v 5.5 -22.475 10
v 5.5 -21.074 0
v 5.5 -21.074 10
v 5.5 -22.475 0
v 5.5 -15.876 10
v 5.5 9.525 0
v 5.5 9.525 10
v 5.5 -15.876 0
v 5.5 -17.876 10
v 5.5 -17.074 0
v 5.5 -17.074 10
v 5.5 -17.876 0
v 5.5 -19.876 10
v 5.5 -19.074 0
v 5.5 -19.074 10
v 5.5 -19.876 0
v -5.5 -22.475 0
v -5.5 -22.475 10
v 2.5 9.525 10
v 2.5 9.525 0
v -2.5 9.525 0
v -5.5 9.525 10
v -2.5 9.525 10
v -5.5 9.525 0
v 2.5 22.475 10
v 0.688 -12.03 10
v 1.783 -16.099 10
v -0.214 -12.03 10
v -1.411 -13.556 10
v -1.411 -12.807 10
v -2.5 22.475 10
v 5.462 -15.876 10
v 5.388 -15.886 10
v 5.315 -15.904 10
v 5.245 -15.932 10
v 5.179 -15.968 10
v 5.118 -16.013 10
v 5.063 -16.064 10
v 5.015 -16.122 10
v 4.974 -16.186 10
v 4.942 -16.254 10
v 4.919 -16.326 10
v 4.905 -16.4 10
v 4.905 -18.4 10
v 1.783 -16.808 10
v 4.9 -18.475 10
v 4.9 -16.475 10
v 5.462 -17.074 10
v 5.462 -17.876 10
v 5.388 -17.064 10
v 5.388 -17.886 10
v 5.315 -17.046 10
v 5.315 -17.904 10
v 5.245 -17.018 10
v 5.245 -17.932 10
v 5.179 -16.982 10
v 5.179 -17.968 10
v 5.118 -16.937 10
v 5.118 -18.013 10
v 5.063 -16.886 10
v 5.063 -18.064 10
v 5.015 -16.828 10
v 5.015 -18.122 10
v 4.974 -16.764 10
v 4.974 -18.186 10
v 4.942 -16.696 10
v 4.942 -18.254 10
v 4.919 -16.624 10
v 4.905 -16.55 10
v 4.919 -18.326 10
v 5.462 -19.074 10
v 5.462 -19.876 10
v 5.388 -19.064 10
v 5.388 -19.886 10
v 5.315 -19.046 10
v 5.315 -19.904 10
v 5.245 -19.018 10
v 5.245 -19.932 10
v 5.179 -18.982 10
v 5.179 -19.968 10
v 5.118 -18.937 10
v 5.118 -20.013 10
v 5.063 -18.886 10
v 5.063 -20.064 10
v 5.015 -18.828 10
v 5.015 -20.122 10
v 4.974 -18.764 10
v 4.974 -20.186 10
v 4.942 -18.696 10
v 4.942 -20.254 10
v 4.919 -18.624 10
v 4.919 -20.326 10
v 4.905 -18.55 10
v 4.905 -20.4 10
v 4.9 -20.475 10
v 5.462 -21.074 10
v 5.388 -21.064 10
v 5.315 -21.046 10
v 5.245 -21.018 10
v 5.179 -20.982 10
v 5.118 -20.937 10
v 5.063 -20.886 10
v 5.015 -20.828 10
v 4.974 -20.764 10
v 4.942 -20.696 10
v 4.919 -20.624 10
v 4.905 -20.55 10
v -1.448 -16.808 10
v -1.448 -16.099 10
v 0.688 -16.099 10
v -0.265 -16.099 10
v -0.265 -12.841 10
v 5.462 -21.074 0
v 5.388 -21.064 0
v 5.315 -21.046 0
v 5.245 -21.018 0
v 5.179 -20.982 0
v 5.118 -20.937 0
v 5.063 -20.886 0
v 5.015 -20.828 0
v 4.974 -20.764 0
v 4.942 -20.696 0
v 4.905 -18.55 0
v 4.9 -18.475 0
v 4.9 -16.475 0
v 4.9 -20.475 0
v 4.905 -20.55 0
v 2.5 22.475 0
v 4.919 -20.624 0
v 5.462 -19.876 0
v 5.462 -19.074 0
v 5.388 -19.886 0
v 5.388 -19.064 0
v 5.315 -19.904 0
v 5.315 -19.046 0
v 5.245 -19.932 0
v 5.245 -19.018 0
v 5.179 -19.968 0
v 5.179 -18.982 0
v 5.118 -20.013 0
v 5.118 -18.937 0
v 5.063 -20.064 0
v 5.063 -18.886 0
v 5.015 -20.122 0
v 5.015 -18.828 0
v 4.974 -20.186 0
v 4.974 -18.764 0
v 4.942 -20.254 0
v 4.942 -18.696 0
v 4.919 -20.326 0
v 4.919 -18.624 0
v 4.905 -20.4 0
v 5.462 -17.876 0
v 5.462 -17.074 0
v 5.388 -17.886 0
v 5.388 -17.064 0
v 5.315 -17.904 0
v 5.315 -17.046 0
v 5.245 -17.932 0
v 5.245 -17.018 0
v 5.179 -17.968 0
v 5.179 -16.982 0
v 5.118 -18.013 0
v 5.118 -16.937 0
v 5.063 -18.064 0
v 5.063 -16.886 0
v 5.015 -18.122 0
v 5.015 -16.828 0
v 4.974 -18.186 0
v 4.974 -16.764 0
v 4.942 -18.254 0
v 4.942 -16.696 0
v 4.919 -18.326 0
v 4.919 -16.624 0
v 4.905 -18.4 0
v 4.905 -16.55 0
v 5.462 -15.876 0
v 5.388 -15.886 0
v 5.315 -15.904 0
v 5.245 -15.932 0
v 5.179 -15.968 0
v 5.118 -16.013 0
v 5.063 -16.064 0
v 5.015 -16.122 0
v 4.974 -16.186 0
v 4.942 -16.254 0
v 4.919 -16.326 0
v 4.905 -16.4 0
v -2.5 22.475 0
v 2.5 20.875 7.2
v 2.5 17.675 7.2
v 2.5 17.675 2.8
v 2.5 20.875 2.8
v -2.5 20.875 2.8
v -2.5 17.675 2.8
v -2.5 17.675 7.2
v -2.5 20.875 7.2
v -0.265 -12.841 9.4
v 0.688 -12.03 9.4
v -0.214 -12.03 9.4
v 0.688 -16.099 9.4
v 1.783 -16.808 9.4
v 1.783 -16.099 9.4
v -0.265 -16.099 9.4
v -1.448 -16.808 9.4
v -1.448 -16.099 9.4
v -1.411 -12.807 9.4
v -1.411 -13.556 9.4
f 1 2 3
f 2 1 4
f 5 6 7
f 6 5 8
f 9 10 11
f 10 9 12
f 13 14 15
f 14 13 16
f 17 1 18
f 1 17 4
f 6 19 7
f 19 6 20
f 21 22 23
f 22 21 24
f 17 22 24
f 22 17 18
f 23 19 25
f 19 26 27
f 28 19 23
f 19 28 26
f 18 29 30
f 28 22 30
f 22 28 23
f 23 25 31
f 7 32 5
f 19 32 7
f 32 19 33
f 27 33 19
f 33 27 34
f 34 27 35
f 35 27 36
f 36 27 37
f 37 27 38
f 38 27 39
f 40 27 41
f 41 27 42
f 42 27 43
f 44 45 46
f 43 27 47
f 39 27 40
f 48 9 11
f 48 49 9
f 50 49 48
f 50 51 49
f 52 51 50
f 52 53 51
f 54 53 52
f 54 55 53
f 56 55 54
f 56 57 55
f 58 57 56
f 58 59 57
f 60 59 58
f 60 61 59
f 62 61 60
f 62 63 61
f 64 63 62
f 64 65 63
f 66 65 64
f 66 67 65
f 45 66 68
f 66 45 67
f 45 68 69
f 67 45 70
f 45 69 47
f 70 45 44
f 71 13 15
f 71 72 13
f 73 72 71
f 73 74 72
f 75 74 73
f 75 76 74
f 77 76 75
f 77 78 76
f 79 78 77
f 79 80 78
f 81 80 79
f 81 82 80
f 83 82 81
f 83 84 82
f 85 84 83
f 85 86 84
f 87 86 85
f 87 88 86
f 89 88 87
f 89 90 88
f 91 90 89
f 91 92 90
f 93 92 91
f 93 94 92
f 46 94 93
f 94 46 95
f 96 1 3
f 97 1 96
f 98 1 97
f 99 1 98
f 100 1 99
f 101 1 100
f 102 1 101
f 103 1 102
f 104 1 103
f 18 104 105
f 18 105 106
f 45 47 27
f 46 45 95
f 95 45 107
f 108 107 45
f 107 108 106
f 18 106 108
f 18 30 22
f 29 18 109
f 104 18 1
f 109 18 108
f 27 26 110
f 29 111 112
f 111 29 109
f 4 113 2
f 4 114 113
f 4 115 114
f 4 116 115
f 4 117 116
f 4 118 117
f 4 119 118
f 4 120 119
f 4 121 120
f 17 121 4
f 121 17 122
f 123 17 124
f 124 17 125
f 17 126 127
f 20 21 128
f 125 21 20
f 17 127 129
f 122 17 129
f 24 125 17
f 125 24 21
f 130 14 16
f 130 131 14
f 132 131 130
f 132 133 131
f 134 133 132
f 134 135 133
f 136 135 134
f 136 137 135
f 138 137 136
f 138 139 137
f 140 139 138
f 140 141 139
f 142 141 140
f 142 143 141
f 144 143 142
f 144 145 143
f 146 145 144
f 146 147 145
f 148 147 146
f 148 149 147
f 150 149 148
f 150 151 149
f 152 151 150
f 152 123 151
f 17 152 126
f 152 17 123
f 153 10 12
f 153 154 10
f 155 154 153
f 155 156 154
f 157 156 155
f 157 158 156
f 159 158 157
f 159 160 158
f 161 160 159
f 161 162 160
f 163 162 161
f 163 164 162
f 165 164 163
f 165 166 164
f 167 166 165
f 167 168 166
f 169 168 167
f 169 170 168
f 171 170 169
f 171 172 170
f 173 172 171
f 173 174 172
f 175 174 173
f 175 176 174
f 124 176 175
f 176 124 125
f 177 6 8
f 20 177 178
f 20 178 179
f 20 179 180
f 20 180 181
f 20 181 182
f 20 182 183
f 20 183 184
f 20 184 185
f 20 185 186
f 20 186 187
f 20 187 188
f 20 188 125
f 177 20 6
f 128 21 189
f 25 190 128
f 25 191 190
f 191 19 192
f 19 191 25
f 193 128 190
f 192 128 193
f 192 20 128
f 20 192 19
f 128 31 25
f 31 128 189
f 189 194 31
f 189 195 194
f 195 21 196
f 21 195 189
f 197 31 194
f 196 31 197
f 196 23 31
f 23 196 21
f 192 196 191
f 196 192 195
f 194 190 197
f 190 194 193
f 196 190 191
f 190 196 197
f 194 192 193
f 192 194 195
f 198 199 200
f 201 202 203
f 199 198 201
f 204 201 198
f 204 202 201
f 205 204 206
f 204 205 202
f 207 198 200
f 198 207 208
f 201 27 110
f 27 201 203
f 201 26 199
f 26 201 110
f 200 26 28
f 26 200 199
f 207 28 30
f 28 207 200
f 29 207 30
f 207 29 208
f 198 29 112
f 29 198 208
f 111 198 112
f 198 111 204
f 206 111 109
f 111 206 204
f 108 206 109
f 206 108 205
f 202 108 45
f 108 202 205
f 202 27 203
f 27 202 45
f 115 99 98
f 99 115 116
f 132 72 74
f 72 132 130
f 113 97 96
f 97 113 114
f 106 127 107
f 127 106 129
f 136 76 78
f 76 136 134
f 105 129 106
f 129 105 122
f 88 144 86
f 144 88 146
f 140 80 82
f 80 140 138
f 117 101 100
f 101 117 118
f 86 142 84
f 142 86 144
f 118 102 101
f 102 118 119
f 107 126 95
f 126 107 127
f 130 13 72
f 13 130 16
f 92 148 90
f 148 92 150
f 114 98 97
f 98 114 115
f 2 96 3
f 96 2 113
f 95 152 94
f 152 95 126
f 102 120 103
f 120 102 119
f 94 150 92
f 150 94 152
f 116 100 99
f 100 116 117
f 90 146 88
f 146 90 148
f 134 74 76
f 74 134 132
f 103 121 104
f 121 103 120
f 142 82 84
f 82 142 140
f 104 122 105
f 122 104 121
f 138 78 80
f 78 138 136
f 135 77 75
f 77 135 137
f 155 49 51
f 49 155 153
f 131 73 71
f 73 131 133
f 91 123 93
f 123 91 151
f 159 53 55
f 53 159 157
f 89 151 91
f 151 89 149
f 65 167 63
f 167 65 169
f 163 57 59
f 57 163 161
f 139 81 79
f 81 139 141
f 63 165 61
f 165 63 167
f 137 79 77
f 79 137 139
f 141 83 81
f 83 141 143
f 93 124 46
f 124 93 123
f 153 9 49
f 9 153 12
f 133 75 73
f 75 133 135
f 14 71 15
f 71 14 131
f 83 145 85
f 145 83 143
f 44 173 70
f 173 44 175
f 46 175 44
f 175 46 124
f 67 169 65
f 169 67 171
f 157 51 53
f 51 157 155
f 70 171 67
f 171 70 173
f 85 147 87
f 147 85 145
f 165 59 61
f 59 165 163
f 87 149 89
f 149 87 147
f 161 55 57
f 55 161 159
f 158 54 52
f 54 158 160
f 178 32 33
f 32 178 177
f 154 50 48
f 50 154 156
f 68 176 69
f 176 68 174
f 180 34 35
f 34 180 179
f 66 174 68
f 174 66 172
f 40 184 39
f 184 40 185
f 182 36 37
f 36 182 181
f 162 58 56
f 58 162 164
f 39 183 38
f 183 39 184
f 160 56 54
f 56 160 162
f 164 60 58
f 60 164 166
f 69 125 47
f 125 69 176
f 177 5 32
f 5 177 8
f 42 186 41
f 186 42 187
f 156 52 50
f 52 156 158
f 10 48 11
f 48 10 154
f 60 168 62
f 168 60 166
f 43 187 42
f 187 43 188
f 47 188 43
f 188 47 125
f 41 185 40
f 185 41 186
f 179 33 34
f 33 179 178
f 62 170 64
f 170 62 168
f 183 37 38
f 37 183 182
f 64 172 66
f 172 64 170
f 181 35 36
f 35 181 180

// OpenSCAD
$fn = 50;

difference() {
	union() {
		translate(v = [0, 9.525, 0]) {
			rotate(a = [90, 0, 0]) {
				difference() {
					union() {
						translate(v = [-5.5, 0, 0]) {
							cube(size = [11.0, 10.0, 32.0]);
						}
						translate(v = [-2.5, 0, -12.95]) {
							cube(size = [5.0, 10.0, 13.049999999999999]);
						}
					}
					union() {
						translate(v = [-2.6, 2.8, -11.35]) {
							cube(size = [5.2, 4.4, 3.1999999999999997]);
						}
						translate(v = [0, 9.4, 24.0]) {
							rotate(a = [-90, 0, 0]) {
								linear_extrude(height = 0.7) {
									text(font = "Arial:style=Bold", halign = "center", size = 5.0, text = "1", valign = "center");
								}
							}
						}
						translate(v = [5.5, 10.1, 30.0]) {
							rotate(a = [90, 0, 0]) {
								cylinder(h = 10.2, r = 0.6);
							}
						}
						translate(v = [5.5, 10.1, 28.0]) {
							rotate(a = [90, 0, 0]) {
								cylinder(h = 10.2, r = 0.6);
							}
						}
						translate(v = [5.5, 10.1, 26.0]) {
							rotate(a = [90, 0, 0]) {
								cylinder(h = 10.2, r = 0.6);
							}
						}
					}
				}
			}
		}
	}
	union();
}
